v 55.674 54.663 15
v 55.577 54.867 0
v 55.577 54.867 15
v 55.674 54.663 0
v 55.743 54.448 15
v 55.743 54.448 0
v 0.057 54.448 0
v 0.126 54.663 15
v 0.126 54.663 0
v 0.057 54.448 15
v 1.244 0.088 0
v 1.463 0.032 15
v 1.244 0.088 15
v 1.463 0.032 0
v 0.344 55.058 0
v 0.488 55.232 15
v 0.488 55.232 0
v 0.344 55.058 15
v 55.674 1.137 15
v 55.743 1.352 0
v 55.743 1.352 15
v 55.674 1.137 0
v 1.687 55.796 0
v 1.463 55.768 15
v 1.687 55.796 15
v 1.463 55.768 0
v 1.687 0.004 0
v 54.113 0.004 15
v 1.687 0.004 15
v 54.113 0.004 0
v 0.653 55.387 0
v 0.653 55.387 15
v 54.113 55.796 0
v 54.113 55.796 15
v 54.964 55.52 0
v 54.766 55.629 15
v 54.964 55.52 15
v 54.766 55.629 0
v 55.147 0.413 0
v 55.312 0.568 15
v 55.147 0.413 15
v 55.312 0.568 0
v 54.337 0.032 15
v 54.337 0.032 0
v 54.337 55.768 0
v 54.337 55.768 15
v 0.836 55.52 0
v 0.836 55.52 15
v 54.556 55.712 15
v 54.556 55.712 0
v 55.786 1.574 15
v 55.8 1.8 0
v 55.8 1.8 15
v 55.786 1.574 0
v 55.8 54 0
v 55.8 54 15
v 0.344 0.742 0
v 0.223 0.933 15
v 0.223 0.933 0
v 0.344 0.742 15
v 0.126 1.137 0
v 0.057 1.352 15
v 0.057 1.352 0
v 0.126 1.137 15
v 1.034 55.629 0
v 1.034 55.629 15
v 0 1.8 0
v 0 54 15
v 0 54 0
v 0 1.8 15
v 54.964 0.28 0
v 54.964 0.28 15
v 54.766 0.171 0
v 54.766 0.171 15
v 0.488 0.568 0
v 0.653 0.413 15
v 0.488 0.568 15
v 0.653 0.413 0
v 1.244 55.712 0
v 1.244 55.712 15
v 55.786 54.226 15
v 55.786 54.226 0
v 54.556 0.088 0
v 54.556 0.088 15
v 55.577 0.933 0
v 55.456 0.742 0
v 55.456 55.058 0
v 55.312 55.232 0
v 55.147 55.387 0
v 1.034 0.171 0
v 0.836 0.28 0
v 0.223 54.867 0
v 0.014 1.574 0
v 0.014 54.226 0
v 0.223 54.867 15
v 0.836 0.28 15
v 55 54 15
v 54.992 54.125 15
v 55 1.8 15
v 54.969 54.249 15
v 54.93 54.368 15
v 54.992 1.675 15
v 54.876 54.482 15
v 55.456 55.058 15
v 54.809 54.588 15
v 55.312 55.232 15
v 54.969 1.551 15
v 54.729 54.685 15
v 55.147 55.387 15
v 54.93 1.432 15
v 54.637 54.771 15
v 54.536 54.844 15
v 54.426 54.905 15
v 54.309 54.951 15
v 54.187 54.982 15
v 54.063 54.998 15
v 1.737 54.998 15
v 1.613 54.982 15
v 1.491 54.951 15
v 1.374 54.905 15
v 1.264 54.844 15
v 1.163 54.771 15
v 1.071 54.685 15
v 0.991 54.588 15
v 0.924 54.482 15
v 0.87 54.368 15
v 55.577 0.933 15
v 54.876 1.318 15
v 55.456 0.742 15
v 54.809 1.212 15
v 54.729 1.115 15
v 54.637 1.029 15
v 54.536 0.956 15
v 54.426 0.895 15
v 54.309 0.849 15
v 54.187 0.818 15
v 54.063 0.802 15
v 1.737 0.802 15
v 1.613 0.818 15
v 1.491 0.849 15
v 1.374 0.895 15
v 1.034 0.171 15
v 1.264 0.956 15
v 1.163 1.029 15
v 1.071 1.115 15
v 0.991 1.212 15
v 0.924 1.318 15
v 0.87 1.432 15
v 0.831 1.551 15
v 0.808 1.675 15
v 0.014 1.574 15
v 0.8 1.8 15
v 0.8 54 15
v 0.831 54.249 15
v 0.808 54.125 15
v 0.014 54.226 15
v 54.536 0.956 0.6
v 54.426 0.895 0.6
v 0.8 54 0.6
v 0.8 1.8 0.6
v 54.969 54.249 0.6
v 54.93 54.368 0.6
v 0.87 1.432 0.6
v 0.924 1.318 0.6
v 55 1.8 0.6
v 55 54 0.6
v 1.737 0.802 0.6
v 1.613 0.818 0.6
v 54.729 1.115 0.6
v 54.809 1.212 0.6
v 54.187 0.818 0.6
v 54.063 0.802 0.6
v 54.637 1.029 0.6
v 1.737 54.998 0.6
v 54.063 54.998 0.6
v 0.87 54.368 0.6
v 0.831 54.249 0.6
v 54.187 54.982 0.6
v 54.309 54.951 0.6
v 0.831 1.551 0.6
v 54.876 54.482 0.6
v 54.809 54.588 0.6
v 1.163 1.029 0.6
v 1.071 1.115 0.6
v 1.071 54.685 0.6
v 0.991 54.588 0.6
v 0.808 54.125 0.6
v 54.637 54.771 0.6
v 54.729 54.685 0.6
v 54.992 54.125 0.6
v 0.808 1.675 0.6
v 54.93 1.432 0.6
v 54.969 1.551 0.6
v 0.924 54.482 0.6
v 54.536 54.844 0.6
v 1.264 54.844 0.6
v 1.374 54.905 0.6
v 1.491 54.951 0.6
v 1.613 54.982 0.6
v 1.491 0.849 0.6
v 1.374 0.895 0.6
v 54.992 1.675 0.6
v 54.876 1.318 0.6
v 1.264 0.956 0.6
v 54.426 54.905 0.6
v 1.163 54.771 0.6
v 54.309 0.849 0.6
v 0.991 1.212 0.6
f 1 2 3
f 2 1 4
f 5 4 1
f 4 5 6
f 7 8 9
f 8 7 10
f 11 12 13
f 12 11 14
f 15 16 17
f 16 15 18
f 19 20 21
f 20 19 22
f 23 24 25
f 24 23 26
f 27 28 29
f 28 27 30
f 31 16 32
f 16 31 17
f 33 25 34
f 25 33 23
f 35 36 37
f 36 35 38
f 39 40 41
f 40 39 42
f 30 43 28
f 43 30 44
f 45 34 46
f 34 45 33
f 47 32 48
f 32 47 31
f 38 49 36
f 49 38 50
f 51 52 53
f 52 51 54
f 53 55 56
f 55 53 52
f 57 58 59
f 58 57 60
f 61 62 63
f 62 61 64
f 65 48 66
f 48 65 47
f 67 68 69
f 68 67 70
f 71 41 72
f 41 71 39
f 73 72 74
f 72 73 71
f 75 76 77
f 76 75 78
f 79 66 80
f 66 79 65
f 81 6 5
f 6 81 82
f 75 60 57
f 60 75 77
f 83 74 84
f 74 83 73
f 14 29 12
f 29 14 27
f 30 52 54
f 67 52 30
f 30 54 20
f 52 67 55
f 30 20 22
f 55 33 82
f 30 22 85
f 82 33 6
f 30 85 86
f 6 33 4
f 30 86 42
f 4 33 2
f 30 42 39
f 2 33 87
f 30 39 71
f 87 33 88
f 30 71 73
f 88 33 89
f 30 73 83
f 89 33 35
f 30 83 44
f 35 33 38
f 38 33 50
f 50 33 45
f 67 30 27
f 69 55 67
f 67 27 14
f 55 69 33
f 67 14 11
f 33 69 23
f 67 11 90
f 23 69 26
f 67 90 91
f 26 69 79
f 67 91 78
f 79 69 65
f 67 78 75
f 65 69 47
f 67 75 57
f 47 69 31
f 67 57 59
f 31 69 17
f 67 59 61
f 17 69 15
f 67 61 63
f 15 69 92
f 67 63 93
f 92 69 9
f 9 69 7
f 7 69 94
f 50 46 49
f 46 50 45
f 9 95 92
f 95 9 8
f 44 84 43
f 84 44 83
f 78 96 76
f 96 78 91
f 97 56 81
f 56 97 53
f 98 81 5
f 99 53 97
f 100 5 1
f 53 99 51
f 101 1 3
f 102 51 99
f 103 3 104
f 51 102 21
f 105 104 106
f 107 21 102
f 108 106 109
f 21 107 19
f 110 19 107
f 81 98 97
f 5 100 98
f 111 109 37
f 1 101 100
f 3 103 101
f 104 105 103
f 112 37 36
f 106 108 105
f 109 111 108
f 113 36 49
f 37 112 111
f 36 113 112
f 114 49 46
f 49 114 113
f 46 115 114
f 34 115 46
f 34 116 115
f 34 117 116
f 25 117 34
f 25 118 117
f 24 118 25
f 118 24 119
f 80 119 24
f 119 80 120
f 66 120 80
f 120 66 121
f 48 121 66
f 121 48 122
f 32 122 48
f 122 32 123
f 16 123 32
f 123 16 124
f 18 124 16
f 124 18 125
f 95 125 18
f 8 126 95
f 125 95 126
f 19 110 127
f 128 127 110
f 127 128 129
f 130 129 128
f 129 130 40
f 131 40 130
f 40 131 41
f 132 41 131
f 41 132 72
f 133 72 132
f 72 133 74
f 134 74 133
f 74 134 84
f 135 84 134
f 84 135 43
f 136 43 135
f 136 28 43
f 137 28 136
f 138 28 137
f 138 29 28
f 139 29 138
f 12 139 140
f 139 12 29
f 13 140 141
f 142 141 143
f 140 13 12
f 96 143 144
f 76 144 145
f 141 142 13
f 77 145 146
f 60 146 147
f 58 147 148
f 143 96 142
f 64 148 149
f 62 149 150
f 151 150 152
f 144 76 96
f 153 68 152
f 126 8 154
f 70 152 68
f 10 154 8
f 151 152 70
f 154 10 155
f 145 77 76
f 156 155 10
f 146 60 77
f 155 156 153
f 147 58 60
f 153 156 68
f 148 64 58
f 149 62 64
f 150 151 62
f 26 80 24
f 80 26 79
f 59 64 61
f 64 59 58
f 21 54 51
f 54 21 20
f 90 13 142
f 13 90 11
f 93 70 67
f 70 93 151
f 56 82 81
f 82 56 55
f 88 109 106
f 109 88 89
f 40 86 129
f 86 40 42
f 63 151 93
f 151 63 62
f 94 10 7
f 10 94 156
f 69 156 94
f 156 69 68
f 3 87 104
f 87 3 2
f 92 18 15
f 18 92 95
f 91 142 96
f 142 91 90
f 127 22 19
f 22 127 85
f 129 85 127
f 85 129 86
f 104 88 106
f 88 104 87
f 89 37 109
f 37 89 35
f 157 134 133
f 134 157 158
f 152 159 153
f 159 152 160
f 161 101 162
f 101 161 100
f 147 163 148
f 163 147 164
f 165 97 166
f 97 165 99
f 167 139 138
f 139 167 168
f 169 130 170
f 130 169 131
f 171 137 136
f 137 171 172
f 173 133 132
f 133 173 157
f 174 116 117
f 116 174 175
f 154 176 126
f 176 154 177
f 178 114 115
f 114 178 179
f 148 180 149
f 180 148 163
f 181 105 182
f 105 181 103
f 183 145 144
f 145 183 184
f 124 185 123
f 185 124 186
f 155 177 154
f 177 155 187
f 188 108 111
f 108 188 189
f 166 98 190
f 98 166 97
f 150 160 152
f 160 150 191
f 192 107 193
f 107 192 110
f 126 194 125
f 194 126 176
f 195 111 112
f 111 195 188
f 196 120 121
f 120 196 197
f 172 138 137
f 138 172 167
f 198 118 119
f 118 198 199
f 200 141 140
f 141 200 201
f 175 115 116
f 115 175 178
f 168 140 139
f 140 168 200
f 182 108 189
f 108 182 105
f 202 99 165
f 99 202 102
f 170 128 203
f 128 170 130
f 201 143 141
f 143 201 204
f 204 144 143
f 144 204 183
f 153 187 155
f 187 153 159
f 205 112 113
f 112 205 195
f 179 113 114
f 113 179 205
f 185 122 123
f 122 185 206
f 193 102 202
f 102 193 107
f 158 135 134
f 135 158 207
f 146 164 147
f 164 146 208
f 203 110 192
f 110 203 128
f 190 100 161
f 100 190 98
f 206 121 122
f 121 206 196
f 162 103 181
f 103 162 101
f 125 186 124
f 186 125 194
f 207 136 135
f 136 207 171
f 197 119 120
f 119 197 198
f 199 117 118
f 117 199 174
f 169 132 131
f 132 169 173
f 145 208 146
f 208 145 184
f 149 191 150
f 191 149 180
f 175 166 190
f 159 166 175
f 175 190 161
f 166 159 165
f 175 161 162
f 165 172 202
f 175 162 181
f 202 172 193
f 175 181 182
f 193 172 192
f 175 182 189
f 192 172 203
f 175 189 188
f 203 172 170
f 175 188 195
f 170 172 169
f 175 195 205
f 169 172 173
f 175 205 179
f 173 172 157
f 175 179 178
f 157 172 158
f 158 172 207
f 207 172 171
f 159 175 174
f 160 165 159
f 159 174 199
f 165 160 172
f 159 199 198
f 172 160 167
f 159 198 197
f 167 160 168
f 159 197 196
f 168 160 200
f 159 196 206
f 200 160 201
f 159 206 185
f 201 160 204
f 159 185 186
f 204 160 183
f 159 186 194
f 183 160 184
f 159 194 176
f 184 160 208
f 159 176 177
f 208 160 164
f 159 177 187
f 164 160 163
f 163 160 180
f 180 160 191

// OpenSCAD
// modular nozzle storage box
// version 0.0.1
// by pixelhaufen
// is licensed under CC BY-SA 3.0 -> https://creativecommons.org/licenses/by-sa/3.0/

//------------------------------------------------------------------
// User Inputs

// create a seperate model for nozzle module, heat break module, box, lid
type = "box"; // [nozzle module,heat break module,box,lid]

/* [nozzle module] */
nozzle_diameter = 6; // [2:1:12]
nozzle_total_hight = 13; // [5:1:30]
nozzle_threaded_hight = 8; // [5:1:25]

/* [heat break module] */
heat_break_diameter = 7; // [2:1:12]
heat_break_length = 23; // [10:1:50]

/* [box] */
rows = 6; // [2:1:20]
columns = 6; // [2:1:20]
clearance = 0.2; // [0:0.1:1]

/*[Hidden]*/
$fn=50;

//------------------------------------------------------------------
// Main

if (type=="nozzle module")
{
    nozzle_module(nozzle_total_hight, nozzle_threaded_hight, nozzle_diameter);
}
else if(type=="heat break module")
{
    heat_break_module(heat_break_diameter, heat_break_length, nozzle_diameter);
}
else if(type=="box")
{
    box(rows, columns, clearance, nozzle_total_hight);
}
else if(type=="lid")
{
    lid(rows, columns, clearance);
}

//------------------------------------------------------------------
// Modules

module nozzle_module(nozzle_total_hight, nozzle_threaded_hight, nozzle_diameter)
{
    difference()
    {
        main_box([nozzle_diameter+3,nozzle_diameter+3,nozzle_threaded_hight+1],radius=1);
        translate([nozzle_diameter/2+1.5,nozzle_diameter/2+1.5,0.6])
            cylinder(r1=nozzle_diameter/2+0.5, r2=nozzle_diameter/2+0.5, h=nozzle_threaded_hight+1, center=false);
    }
}

module heat_break_module(heat_break_diameter, heat_break_length, nozzle_diameter)
{
    heat_break_length_multiple = ceil((heat_break_length+3)/(nozzle_diameter+3));
    heat_break_diameter_multiple = ceil((heat_break_diameter+1.8)/(nozzle_diameter+3));
      
    difference()
    {
        main_box([(nozzle_diameter+3)*heat_break_diameter_multiple,(nozzle_diameter+3)*heat_break_length_multiple,nozzle_threaded_hight+1],radius=1);
        
        translate([((nozzle_diameter+3)*heat_break_diameter_multiple -
         (heat_break_diameter+1))/2,((nozzle_diameter+3)*heat_break_length_multiple -
         (heat_break_length+1))/2,0])
            translate([heat_break_diameter/2+0.5 ,heat_break_length/2+0.5 ,nozzle_threaded_hight+1])
                rotate([-90,0,0])
                    cylinder(r1=heat_break_diameter/2+0.5, r2=heat_break_diameter/2+0.5, h=heat_break_length+1, center=true);
    }
}

module box(rows, columns, clearance, nozzle_total_hight)
{
    difference()
    {
        main_box([(nozzle_diameter+3)*rows+clearance+1.6,(nozzle_diameter+3)*columns+clearance+1.6,nozzle_total_hight+2],radius=1.8);
        translate([0.8, 0.8, 0.6])
            main_box([(nozzle_diameter+3)*rows+clearance,(nozzle_diameter+3)*columns+clearance,nozzle_total_hight+2],radius=1);
    }
}

module lid(rows, columns, clearance)
{
    difference()
    {
        main_box([(nozzle_diameter+3)*rows+clearance+3.2,(nozzle_diameter+3)*columns+clearance+3.2,3],radius=2.6);
        translate([0.8, 0.8, 0.6])
            main_box([(nozzle_diameter+3)*rows+clearance+1.6,(nozzle_diameter+3)*columns+clearance+1.6,3],radius=1.8);
    }
}

module main_box(size,radius)
{
    hull()
    {
        translate([radius, radius, 0])
            cylinder(r1=radius, r2=radius, h=size[2], center=false);
        translate([size[0]-radius, radius, 0])
            cylinder(r1=radius, r2=radius, h=size[2], center=false);
        translate([radius, size[1]-radius, 0])
            cylinder(r1=radius, r2=radius, h=size[2], center=false);
        translate([size[0]-radius, size[1]-radius, 0])
            cylinder(r1=radius, r2=radius, h=size[2], center=false);
    }
}
